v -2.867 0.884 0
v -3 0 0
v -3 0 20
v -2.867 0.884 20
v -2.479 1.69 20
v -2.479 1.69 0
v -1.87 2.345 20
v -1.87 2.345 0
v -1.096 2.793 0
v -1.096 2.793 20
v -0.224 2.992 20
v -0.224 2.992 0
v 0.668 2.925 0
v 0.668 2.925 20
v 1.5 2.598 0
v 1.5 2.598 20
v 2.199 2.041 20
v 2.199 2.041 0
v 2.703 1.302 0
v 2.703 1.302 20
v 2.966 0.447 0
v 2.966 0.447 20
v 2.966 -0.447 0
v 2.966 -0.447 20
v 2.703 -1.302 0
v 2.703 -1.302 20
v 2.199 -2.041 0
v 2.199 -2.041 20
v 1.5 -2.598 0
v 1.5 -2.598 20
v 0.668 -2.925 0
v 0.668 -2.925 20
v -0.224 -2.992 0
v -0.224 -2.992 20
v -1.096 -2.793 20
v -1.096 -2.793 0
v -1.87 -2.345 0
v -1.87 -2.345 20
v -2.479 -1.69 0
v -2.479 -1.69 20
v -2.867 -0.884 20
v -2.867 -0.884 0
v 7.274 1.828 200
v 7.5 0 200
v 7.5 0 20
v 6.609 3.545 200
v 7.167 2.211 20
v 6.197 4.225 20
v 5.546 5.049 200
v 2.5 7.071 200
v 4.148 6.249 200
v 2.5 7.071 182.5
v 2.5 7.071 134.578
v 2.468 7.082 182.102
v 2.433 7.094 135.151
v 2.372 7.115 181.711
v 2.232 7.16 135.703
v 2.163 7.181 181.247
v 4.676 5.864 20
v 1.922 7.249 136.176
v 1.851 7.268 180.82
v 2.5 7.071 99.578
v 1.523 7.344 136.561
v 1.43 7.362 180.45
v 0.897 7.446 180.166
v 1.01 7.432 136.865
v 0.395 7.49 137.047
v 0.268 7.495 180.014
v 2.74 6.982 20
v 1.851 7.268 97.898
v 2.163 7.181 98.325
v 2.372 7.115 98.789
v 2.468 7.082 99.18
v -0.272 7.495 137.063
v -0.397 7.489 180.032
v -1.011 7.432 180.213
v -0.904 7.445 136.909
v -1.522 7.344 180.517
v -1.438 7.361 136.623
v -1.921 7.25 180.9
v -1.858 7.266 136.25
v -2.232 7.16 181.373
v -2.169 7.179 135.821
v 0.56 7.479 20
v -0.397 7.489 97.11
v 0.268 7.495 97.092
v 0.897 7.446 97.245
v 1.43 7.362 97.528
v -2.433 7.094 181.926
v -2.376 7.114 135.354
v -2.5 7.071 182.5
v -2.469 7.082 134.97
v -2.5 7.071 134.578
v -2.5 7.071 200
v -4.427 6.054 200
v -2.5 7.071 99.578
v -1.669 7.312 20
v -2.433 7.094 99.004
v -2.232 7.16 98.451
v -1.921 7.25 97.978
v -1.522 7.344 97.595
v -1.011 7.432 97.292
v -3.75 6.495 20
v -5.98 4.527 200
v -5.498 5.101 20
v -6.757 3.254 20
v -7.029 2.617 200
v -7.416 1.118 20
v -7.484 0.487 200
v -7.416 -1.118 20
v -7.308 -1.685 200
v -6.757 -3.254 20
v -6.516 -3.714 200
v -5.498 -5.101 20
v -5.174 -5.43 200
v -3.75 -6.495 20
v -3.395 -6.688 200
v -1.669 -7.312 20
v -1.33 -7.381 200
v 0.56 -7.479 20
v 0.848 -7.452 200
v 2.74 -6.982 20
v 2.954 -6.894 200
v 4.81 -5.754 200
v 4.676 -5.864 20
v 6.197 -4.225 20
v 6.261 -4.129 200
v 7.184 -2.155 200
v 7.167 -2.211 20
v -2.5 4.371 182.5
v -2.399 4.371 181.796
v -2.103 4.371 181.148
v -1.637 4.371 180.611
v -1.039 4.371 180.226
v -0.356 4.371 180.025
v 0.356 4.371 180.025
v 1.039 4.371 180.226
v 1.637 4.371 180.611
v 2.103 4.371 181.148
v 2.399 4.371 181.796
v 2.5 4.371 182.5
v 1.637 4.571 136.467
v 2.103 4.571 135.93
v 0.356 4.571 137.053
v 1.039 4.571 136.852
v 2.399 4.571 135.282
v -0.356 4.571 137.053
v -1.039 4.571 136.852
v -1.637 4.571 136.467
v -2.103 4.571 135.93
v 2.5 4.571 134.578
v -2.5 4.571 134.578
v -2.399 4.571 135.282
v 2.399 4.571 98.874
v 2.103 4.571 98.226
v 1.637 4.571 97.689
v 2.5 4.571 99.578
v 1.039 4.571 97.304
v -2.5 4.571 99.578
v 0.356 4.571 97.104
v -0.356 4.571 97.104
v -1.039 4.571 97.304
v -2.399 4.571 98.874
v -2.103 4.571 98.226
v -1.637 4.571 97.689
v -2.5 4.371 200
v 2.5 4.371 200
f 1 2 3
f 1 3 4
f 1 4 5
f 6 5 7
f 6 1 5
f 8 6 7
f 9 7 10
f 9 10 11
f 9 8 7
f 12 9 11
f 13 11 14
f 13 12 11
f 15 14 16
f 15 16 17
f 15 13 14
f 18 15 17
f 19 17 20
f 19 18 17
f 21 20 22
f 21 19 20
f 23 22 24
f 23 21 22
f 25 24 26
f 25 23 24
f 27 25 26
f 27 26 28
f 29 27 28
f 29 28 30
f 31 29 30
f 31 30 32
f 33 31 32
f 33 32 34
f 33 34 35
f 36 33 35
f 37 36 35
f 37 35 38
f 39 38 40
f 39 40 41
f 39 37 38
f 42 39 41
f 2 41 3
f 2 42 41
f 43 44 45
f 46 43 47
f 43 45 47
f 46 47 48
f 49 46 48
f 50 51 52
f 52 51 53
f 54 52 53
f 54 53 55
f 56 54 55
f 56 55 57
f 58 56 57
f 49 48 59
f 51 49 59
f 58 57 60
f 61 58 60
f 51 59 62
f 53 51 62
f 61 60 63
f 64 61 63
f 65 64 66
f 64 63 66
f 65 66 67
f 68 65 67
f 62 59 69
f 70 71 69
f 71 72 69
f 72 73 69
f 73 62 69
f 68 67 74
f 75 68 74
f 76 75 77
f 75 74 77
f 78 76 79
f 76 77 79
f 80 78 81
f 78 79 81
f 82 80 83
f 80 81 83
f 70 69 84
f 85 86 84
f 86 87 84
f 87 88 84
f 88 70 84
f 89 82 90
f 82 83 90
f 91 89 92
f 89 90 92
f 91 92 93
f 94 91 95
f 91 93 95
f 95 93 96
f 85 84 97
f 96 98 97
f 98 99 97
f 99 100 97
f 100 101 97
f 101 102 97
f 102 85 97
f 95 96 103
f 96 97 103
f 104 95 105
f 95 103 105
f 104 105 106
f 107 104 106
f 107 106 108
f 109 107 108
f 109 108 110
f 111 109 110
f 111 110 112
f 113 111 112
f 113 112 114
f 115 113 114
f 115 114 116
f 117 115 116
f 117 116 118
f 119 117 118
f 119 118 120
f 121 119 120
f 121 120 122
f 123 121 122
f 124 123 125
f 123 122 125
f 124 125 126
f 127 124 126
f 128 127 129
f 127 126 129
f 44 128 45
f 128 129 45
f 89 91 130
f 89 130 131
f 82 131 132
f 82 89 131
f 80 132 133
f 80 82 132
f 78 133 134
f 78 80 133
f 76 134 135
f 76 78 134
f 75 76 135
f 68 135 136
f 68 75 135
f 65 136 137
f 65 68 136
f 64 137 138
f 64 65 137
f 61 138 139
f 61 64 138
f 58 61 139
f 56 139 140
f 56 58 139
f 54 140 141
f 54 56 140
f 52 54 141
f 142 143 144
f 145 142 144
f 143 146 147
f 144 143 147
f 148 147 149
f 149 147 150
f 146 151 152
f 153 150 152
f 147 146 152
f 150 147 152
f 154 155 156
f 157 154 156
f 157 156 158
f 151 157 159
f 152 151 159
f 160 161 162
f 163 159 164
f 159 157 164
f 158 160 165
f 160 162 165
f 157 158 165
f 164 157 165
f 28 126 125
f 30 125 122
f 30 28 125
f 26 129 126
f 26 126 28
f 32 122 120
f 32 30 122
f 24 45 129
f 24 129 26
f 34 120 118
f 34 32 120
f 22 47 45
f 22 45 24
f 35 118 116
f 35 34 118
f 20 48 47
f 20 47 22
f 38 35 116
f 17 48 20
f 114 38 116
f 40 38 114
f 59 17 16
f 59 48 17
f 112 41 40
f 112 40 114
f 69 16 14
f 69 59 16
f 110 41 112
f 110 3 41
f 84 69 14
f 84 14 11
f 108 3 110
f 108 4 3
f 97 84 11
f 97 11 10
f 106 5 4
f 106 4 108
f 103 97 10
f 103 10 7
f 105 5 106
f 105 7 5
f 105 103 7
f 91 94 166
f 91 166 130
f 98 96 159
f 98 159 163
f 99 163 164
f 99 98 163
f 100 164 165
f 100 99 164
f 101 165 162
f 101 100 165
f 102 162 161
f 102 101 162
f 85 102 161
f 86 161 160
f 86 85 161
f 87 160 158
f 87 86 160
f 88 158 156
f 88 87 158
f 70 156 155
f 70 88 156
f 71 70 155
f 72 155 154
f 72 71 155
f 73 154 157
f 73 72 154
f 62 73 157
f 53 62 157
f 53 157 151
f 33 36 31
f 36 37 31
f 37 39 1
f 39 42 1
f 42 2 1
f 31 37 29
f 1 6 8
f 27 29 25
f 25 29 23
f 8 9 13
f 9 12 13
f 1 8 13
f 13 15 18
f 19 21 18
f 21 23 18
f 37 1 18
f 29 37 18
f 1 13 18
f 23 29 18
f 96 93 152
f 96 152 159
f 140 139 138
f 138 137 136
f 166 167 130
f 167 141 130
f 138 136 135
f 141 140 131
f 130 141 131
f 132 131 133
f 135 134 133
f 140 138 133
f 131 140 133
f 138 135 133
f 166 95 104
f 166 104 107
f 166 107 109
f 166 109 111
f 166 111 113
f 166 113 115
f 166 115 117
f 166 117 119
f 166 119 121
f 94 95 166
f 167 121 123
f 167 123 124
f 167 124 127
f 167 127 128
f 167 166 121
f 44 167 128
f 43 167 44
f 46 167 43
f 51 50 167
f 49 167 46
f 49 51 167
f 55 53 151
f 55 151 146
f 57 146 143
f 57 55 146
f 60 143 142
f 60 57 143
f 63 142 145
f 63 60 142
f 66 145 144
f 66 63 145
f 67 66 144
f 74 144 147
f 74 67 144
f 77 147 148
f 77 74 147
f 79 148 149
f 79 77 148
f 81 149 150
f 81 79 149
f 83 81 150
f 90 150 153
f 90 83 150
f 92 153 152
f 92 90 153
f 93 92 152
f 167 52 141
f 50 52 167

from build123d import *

# Parameters (mm, degrees)
SKETCH1_R           = 7.5
BOSS_EXTRUDE1_DEPTH = 200
SKETCH2_R           = 7.5
SKETCH2_R_2         = 3
CUT_EXTRUDE1_DEPTH  = 20
CUT_EXTRUDE3_START  = 10
CUT_EXTRUDE3_DEPTH  = 12.5
CUT_EXTRUDE4_START  = 10
CUT_EXTRUDE4_DEPTH  = 12.7


with BuildPart() as part:
    # Sketch1 → Boss-Extrude1 (new body)
    with BuildSketch(Plane.XY):
        Circle(SKETCH1_R)
    extrude(amount=BOSS_EXTRUDE1_DEPTH)

    # Sketch2 → Cut-Extrude1 (cut)
    with BuildSketch(Plane(origin=(0, 0, 0), x_dir=(-1, 0, 0), z_dir=(0, 0, -1))):
        Circle(SKETCH2_R)
        Circle(SKETCH2_R_2, mode=Mode.SUBTRACT)
    extrude(amount=-CUT_EXTRUDE1_DEPTH, mode=Mode.SUBTRACT)

    # Sketch5 → Cut-Extrude3 (cut)
    with BuildSketch(Plane(origin=(0, 7.071067812, 0), x_dir=(1, 0, 0), z_dir=(0, 1, 0)).offset(CUT_EXTRUDE3_START)):
        with BuildLine():
            Line((2.5, -99.5781), (2.5, -134.5781))
            ThreePointArc((2.5, -134.5781), (0, -137.0781), (-2.5, -134.5781))
            Line((-2.5, -134.5781), (-2.5, -99.5781))
            ThreePointArc((-2.5, -99.5781), (0, -97.0781), (2.5, -99.5781))
        make_face()
    extrude(amount=-CUT_EXTRUDE3_DEPTH, mode=Mode.SUBTRACT)

    # Sketch6 → Cut-Extrude4 (cut)
    with BuildSketch(Plane(origin=(0, 7.071067812, 0), x_dir=(1, 0, 0), z_dir=(0, 1, 0)).offset(CUT_EXTRUDE4_START)):
        with BuildLine():
            Line((-2.5, -200), (-2.5, -182.5))
            ThreePointArc((-2.5, -182.5), (0, -180), (2.5, -182.5))
            Line((2.5, -182.5), (2.5, -200))
            ThreePointArc((2.5, -200), (0, -202.5), (-2.5, -200))
        make_face()
    extrude(amount=-CUT_EXTRUDE4_DEPTH, mode=Mode.SUBTRACT)


solid = part.part
